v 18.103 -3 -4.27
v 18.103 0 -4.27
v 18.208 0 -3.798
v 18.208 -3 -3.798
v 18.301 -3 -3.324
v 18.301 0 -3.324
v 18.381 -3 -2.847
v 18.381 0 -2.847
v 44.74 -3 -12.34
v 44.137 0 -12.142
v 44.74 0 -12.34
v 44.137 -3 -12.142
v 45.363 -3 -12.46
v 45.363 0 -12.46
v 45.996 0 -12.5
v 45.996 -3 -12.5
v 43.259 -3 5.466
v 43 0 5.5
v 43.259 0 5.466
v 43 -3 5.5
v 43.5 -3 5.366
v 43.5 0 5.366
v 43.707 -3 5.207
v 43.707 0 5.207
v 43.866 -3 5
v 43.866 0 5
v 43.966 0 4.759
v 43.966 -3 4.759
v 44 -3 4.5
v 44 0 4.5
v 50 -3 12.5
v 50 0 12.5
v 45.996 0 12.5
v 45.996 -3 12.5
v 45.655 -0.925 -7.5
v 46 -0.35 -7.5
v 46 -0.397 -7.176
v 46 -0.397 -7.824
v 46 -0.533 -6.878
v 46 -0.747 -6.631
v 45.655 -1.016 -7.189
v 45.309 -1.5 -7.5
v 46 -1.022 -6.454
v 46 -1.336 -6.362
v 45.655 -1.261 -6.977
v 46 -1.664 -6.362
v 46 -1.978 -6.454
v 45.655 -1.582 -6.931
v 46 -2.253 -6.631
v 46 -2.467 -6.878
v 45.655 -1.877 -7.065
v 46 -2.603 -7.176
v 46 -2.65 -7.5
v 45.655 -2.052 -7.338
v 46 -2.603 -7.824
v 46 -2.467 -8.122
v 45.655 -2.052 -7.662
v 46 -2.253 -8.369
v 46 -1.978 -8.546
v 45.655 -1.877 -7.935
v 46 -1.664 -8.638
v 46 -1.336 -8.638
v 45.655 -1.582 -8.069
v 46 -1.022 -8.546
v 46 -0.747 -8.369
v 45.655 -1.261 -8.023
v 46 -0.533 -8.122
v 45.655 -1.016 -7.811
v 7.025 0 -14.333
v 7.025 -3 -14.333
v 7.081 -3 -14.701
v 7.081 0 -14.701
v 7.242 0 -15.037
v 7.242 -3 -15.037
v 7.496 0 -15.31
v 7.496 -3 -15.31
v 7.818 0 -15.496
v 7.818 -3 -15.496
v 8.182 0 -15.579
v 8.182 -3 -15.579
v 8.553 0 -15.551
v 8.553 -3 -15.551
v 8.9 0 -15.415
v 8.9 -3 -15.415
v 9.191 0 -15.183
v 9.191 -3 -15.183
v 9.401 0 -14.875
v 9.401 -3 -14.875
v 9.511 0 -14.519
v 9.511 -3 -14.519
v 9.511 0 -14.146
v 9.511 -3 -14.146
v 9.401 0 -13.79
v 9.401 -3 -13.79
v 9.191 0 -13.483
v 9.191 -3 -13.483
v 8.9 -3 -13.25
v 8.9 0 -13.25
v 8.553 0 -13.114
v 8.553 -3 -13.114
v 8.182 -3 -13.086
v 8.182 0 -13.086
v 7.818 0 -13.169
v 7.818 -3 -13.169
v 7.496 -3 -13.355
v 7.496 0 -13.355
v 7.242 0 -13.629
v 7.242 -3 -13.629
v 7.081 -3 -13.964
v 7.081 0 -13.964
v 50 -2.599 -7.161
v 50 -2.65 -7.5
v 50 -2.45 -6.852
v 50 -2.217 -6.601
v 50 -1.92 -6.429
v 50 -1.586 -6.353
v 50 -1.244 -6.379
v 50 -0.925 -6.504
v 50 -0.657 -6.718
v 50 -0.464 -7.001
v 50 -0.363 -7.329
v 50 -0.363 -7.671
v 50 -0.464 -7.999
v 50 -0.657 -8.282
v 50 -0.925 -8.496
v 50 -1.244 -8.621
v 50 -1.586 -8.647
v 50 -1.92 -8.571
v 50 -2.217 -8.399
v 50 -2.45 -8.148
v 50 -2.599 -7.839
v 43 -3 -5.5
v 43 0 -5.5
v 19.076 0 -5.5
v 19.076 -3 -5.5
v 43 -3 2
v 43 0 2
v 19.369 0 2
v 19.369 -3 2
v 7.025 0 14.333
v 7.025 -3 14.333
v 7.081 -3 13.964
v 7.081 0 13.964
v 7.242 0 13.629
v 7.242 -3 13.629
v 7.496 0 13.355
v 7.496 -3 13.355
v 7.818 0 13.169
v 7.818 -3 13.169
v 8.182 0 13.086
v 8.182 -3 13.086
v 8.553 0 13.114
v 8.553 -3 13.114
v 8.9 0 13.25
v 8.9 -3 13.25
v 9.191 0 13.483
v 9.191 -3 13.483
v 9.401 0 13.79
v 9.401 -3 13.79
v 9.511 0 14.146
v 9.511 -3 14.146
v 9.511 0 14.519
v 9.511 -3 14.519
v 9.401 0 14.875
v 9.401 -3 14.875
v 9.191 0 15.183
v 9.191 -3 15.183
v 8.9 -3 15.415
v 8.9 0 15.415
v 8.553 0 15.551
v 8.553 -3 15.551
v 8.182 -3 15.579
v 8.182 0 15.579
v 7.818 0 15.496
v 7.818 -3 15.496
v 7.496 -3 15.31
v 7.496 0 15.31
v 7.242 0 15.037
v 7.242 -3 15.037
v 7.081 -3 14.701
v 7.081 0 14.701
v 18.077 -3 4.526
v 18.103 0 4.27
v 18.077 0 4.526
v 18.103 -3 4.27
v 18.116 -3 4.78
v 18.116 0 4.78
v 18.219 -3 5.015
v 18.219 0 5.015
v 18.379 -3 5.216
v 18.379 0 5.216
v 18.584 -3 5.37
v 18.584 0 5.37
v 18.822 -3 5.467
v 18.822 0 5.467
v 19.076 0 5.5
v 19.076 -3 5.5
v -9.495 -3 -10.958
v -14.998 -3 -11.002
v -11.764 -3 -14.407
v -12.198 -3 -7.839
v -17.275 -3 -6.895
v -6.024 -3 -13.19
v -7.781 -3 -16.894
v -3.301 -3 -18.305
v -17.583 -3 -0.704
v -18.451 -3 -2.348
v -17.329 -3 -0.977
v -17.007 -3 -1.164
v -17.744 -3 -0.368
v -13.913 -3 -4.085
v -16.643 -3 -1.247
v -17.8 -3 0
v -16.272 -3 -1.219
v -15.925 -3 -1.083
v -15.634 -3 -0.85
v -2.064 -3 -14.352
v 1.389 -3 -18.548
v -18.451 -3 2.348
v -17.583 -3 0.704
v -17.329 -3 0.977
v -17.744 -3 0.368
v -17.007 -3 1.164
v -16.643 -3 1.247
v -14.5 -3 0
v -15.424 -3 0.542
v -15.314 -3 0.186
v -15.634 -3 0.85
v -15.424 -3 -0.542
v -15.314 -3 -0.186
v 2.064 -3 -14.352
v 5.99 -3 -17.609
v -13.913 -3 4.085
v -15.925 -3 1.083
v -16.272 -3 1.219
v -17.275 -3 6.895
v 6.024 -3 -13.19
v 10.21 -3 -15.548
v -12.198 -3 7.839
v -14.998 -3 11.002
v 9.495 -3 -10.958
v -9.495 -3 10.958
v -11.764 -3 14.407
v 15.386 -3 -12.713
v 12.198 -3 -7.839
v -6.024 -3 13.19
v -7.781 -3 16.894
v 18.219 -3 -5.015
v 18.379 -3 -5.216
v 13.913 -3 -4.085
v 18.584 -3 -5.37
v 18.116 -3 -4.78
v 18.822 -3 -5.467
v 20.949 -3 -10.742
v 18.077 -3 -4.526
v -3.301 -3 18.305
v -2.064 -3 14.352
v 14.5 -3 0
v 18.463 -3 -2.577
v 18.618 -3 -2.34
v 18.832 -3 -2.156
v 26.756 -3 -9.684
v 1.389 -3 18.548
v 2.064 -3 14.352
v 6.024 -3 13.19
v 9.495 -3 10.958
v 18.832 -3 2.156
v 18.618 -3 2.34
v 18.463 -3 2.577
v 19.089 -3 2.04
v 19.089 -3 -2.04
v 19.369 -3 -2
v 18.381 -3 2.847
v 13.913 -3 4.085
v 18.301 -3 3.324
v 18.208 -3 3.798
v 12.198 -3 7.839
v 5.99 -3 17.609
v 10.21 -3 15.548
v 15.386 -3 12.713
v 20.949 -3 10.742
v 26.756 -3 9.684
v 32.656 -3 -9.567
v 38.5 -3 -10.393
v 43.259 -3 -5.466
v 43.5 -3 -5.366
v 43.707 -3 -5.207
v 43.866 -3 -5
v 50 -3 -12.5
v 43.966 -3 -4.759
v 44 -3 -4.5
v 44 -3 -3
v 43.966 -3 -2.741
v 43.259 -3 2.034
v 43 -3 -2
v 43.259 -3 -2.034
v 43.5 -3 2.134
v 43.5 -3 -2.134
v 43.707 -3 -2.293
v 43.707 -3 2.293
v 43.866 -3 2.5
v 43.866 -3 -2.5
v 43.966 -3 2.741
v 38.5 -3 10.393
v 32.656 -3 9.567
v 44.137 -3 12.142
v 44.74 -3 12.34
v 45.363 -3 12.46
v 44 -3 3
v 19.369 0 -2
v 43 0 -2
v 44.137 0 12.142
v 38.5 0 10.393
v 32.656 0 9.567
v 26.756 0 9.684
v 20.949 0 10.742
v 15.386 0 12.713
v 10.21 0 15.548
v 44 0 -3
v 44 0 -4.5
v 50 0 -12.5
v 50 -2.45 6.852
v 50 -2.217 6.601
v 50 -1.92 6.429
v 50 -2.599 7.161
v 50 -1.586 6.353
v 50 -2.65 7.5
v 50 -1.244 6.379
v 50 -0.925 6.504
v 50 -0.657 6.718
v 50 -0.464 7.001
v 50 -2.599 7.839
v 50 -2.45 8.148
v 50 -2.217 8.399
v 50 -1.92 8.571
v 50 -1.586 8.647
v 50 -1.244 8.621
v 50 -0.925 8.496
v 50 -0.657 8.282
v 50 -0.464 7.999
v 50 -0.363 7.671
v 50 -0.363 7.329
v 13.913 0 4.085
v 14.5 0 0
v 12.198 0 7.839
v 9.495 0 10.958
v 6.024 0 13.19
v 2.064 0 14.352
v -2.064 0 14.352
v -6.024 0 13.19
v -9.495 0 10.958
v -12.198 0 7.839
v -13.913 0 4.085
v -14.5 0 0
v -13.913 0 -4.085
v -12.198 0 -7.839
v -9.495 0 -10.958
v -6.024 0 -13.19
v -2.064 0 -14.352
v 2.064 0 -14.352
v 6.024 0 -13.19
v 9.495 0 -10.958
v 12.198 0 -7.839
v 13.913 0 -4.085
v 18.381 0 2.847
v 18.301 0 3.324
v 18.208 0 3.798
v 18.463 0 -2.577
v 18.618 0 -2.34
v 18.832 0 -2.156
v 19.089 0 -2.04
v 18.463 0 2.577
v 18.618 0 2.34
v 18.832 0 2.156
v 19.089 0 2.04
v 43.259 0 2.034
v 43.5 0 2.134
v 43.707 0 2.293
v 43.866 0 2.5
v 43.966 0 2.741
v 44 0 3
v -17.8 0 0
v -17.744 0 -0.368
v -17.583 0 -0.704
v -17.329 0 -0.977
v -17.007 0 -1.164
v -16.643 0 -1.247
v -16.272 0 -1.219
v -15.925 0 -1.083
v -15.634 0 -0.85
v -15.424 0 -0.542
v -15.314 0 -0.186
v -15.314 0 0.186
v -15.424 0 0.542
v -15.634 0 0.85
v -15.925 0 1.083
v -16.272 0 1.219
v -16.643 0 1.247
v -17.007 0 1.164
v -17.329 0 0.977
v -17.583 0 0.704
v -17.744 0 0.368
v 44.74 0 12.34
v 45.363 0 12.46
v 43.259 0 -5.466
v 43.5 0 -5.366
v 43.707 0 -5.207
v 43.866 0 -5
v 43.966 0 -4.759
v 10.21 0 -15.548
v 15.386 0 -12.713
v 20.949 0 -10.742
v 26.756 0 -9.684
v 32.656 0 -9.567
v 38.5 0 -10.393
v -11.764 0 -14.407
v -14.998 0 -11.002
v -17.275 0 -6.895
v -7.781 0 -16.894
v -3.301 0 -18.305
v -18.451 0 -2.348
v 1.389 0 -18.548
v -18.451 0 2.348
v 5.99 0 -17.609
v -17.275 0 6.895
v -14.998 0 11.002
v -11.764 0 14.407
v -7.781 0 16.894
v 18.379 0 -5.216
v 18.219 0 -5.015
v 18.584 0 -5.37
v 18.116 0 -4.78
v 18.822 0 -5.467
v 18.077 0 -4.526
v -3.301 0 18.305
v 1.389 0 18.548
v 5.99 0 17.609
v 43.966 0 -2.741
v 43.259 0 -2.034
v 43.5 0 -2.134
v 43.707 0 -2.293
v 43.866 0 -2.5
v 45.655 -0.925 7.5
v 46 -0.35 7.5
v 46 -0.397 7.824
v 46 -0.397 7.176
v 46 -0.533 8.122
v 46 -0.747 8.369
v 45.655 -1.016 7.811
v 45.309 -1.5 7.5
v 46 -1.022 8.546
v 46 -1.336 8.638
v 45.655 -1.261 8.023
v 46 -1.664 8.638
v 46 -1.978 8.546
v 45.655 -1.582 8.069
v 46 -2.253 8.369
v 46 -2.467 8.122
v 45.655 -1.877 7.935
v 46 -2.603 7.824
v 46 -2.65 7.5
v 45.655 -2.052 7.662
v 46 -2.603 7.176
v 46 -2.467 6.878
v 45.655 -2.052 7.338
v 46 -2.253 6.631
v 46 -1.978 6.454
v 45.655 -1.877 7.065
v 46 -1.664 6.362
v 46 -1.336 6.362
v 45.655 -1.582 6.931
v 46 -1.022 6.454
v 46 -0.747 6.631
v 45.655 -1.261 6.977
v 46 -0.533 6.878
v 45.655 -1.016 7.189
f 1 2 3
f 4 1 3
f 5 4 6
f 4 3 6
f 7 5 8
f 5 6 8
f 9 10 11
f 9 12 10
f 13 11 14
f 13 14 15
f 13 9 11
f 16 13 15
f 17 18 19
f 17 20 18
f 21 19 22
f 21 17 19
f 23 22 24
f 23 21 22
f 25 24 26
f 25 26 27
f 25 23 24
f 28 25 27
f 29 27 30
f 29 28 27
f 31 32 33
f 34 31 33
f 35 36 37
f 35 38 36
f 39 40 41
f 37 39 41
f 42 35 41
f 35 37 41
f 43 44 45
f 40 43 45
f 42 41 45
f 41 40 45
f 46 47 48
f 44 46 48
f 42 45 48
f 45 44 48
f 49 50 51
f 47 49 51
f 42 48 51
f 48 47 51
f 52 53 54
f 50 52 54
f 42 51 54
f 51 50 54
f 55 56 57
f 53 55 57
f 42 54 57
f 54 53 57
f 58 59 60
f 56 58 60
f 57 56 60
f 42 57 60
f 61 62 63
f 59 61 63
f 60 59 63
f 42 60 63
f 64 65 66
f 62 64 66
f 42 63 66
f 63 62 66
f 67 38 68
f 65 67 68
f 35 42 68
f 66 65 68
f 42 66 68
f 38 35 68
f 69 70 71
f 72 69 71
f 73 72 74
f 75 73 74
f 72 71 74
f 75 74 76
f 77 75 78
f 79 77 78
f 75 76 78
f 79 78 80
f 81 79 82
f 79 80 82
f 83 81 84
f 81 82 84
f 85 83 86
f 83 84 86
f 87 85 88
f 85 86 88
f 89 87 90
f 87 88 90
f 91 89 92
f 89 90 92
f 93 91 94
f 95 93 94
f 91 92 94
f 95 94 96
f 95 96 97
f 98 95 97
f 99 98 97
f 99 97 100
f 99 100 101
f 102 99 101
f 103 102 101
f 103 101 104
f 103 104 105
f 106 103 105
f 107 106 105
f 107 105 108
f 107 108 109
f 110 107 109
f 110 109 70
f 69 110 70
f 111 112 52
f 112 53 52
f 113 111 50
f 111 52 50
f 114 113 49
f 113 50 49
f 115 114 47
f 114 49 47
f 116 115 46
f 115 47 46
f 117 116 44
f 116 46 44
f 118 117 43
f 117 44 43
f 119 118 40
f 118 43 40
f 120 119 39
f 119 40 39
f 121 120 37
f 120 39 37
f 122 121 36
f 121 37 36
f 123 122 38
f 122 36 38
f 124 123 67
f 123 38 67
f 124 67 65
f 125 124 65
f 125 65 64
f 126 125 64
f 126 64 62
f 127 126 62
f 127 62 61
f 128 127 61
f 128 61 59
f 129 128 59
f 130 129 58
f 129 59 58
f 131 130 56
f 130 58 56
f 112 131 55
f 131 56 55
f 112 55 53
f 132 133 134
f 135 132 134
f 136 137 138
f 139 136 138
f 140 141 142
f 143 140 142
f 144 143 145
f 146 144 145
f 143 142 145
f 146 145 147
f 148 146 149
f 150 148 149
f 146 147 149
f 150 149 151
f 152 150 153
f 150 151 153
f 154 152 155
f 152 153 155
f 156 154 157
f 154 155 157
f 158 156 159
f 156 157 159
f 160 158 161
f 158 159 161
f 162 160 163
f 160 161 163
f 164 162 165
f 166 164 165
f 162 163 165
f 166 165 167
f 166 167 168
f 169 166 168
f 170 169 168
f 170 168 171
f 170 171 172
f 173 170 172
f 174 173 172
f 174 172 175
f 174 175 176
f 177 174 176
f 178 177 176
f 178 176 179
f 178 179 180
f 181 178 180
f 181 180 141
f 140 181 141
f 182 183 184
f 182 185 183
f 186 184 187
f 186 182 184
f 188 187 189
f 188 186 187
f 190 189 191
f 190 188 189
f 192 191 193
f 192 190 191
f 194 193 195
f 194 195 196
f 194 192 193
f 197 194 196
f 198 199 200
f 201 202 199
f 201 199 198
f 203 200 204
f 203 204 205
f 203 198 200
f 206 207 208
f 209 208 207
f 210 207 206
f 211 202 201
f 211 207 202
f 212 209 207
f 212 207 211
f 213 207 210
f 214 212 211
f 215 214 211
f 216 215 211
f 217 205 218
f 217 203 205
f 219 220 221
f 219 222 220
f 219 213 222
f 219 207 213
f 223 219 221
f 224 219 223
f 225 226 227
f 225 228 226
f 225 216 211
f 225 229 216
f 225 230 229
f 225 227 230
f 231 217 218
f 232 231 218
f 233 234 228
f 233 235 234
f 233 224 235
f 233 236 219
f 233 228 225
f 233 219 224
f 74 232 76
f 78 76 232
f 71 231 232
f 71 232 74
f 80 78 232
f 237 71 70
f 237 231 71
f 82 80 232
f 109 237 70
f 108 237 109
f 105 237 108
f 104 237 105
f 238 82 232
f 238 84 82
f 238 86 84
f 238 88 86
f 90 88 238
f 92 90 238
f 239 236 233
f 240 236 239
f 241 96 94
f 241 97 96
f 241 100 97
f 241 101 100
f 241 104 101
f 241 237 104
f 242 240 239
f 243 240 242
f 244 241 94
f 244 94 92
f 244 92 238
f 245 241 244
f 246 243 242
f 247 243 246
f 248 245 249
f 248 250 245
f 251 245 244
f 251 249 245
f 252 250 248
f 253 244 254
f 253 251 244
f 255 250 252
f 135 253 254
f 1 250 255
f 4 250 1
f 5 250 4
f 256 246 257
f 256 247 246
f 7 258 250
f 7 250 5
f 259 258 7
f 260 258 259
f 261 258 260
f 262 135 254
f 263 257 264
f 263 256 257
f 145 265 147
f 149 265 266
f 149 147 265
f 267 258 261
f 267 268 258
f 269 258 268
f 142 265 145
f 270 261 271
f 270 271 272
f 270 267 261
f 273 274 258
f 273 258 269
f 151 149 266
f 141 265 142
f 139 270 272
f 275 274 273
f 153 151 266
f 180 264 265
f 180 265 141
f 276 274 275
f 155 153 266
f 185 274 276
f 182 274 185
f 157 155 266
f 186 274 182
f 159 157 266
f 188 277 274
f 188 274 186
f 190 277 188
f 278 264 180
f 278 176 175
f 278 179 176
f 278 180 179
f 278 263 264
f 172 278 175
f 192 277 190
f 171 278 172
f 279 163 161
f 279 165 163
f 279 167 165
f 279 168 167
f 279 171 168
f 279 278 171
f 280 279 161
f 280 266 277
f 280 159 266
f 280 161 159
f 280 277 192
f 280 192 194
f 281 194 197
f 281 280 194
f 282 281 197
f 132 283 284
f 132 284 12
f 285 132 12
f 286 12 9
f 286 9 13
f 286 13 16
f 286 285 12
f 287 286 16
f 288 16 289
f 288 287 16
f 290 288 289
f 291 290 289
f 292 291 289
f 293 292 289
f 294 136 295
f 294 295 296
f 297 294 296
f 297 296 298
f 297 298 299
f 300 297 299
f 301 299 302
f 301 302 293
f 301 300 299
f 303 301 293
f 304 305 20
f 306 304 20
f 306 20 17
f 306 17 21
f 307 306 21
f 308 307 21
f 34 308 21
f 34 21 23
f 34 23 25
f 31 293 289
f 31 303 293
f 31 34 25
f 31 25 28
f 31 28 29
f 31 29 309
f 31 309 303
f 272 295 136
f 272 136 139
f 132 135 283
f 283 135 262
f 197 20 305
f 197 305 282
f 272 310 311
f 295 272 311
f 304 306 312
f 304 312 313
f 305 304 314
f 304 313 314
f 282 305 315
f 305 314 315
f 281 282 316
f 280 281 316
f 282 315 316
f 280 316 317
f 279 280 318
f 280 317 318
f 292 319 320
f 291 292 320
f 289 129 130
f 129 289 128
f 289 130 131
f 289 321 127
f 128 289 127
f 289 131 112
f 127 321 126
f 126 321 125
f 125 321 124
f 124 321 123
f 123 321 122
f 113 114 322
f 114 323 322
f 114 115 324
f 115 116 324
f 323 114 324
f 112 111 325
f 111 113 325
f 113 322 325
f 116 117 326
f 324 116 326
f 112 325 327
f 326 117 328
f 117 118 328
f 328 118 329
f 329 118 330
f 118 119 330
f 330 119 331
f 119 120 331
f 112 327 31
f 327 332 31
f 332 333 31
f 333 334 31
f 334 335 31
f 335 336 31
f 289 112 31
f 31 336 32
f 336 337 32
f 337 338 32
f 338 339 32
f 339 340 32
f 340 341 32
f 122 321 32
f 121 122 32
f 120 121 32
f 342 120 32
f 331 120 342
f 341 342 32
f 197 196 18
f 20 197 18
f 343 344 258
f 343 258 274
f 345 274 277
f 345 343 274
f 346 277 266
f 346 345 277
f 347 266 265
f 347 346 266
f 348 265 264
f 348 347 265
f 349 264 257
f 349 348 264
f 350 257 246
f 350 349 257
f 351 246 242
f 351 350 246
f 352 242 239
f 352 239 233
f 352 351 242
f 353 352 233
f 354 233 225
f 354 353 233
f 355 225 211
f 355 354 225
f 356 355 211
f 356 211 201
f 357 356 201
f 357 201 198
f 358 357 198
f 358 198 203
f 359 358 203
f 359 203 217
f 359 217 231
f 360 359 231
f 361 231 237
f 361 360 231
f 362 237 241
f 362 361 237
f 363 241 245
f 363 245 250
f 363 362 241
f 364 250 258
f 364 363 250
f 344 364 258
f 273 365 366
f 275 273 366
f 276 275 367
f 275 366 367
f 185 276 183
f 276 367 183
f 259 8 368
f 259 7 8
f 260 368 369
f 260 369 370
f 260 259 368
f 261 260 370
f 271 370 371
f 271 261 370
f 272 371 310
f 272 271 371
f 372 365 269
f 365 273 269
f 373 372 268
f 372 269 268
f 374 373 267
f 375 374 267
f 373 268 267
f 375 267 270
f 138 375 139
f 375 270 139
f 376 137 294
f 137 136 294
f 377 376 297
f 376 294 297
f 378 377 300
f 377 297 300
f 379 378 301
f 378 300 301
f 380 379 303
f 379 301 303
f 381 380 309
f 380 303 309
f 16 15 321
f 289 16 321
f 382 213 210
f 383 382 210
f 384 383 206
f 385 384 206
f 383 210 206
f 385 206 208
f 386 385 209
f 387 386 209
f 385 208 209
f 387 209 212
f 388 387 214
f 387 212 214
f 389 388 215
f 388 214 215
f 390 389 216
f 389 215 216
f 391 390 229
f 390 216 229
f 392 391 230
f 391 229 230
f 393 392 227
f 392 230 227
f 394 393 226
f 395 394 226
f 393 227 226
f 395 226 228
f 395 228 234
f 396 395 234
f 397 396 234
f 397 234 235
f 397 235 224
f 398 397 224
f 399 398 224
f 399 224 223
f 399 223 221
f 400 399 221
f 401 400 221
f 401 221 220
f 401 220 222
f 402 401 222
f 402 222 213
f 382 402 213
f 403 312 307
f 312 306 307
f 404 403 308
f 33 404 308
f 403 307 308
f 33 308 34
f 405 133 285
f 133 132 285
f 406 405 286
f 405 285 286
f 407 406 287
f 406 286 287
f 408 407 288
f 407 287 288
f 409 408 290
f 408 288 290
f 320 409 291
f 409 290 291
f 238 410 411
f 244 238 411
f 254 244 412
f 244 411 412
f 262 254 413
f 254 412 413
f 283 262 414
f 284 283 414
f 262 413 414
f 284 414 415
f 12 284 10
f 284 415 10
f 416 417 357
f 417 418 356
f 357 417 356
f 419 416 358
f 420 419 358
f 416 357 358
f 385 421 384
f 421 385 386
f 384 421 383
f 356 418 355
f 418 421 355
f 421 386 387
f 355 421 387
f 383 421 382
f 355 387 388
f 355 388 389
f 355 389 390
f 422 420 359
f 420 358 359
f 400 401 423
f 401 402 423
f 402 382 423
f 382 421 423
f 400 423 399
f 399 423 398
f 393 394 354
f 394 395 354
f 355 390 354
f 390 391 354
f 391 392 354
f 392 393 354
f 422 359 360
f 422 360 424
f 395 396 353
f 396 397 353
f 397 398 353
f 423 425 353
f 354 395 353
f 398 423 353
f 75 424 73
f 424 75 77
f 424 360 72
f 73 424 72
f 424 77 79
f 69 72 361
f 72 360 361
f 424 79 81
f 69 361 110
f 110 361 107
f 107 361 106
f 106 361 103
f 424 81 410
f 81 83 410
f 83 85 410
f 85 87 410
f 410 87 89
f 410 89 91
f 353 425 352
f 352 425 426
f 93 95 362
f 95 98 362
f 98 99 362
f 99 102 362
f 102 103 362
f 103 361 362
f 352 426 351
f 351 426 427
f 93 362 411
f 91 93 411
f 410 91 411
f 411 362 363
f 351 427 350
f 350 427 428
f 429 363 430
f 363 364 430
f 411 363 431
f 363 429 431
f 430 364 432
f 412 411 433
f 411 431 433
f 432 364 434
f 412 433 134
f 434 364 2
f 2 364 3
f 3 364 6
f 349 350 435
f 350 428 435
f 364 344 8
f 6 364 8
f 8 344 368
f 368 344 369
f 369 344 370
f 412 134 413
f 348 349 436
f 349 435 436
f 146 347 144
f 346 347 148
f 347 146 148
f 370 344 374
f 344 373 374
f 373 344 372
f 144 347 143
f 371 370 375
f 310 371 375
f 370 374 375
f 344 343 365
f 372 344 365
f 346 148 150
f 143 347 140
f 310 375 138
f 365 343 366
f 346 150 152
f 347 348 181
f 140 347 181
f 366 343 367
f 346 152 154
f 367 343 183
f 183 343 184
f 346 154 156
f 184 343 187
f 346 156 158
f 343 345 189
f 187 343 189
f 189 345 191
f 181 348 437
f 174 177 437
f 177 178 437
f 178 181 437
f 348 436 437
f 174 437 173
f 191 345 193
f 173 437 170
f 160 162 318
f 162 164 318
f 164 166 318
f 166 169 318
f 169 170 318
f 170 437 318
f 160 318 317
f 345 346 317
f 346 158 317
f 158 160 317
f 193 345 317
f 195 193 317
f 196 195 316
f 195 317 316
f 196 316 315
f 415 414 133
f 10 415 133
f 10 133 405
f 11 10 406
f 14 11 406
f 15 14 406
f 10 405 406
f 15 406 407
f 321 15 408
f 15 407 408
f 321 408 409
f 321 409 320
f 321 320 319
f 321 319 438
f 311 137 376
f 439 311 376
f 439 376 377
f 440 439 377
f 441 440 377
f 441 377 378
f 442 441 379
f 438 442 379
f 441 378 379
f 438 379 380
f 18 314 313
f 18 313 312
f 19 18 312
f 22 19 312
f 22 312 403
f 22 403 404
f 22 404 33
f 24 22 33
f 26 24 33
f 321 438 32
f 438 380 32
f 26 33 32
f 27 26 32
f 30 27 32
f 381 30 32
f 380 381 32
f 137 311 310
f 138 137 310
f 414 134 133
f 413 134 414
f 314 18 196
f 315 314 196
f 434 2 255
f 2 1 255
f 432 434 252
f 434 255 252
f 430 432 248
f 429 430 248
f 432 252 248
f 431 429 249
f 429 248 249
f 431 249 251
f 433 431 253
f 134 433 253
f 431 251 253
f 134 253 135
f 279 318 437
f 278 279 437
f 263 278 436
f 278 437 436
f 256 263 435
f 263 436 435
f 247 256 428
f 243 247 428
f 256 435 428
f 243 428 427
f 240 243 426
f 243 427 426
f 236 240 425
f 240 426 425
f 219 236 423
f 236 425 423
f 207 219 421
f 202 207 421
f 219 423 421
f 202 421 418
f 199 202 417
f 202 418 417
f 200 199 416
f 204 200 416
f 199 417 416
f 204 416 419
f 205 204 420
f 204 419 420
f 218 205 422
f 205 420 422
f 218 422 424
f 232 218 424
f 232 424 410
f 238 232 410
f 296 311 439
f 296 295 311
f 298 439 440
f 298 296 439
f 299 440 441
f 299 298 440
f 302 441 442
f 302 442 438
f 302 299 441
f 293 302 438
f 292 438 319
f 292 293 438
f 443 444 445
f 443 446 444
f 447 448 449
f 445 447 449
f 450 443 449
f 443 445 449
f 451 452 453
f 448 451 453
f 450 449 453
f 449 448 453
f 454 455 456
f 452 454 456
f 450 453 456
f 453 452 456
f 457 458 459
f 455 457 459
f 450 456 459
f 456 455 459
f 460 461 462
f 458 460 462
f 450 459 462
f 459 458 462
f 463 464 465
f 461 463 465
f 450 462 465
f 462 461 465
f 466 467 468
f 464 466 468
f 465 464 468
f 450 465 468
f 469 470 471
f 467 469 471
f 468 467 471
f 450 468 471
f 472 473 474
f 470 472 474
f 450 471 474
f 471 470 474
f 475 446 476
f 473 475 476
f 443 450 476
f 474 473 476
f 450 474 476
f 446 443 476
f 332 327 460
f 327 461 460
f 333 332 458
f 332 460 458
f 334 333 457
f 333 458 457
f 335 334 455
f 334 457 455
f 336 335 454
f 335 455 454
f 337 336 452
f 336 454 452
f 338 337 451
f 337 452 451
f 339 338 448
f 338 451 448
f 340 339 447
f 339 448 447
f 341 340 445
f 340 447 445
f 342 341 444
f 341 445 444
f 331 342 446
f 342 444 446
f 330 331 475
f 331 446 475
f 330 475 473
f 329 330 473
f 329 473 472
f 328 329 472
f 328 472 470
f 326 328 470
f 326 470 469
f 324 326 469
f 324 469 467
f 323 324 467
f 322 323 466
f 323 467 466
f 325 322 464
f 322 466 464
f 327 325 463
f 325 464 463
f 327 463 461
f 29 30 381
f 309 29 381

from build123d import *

# Parameters (mm, degrees)
F0_R     = 14.5
F1_DEPTH = 3
F2_D     = 2.5
F3_R     = 1
F4_R     = 5
F6_D     = 2.3
F6_DEPTH = 4
F6_TIP   = 0.6909897119


with BuildPart() as f1:
    # F0 (on Front) → F1 (new body)
    with BuildSketch(Plane.XZ):
        with BuildLine():
            ThreePointArc((18.4921605011, -2), (18.5730205583, -1.0014526146), (18.6, 0))
            ThreePointArc((18.6, 0), (18.5730205583, 1.0014526146), (18.4921605011, 2))
            ThreePointArc((18.4921605011, 2), (18.2144580261, 3.7674286742), (17.7682300751, 5.5))
            ThreePointArc((17.7682300751, 5.5), (14.8636221286, 11.1818038445), (10.2095594024, 15.5475045203))
            ThreePointArc((10.2095594024, 15.5475045203), (-18.6, 0), (10.2095594024, -15.5475045203))
            ThreePointArc((10.2095594024, -15.5475045203), (14.8636221286, -11.1818038445), (17.7682300751, -5.5))
            ThreePointArc((17.7682300751, -5.5), (18.2144580261, -3.7674286742), (18.4921605011, -2))
        make_face()
        Circle(F0_R, mode=Mode.SUBTRACT)
        with BuildLine():
            ThreePointArc((18.4921605011, 2), (18.5730205583, 1.0014526146), (18.6, 0))
            ThreePointArc((18.6, 0), (18.5730205583, -1.0014526146), (18.4921605011, -2))
            Line((18.4921605011, -2), (44, -2))
            Line((44, -2), (44, -5.5))
            Line((44, -5.5), (17.7682300751, -5.5))
            ThreePointArc((17.7682300751, -5.5), (14.8636221286, -11.1818038445), (10.2095594024, -15.5475045203))
            ThreePointArc((10.2095594024, -15.5475045203), (27.2208300421, -9.6405667001), (45, -12.5))
            Line((45, -12.5), (50, -12.5))
            Line((50, -12.5), (50, 12.5))
            Line((50, 12.5), (45, 12.5))
            ThreePointArc((45, 12.5), (27.2208300421, 9.6405667001), (10.2095594024, 15.5475045203))
            ThreePointArc((10.2095594024, 15.5475045203), (14.8636221286, 11.1818038445), (17.7682300751, 5.5))
            Line((17.7682300751, 5.5), (44, 5.5))
            Line((44, 5.5), (44, 2))
            Line((44, 2), (18.4921605011, 2))
        make_face()
    extrude(amount=F1_DEPTH)

    # F2 (through all)
    with Locations(Plane(origin=(0, 0, 0), x_dir=(1, 0, 0), z_dir=(0, 1, 0))):
        with Locations((-16.55, 0), (8.275, 14.3327204326), (8.275, -14.3327204326)):
            Hole(F2_D / 2)

    # F3
    f3_edges = [f1.edges().sort_by_distance(p)[0] for p in [
        (17.76823, -1.5, 5.5),
        (18.492161, -1.5, -2),
        (18.492161, -1.5, 2),
        (17.76823, -1.5, -5.5),
        (44, -1.5, -2),
        (44, -1.5, 5.5),
        (44, -1.5, 2),
        (44, -1.5, -5.5),
    ]]
    fillet(f3_edges, radius=F3_R)

    # F4
    f4_edges = [f1.edges().sort_by_distance(p)[0] for p in [
        (45, -1.5, 12.5),
        (45, -1.5, -12.5),
    ]]
    fillet(f4_edges, radius=F4_R)

    # F6
    with Locations(Plane.YZ.offset(50)):
        with Locations((-1.5, 7.5), (-1.5, -7.5)):
            Hole(F6_D / 2, depth=F6_DEPTH)
            with Locations((0, 0, -(F6_DEPTH + F6_TIP / 2))):  # 118° drill point
                Cone(0, F6_D / 2, F6_TIP, mode=Mode.SUBTRACT)


solid = f1.part
